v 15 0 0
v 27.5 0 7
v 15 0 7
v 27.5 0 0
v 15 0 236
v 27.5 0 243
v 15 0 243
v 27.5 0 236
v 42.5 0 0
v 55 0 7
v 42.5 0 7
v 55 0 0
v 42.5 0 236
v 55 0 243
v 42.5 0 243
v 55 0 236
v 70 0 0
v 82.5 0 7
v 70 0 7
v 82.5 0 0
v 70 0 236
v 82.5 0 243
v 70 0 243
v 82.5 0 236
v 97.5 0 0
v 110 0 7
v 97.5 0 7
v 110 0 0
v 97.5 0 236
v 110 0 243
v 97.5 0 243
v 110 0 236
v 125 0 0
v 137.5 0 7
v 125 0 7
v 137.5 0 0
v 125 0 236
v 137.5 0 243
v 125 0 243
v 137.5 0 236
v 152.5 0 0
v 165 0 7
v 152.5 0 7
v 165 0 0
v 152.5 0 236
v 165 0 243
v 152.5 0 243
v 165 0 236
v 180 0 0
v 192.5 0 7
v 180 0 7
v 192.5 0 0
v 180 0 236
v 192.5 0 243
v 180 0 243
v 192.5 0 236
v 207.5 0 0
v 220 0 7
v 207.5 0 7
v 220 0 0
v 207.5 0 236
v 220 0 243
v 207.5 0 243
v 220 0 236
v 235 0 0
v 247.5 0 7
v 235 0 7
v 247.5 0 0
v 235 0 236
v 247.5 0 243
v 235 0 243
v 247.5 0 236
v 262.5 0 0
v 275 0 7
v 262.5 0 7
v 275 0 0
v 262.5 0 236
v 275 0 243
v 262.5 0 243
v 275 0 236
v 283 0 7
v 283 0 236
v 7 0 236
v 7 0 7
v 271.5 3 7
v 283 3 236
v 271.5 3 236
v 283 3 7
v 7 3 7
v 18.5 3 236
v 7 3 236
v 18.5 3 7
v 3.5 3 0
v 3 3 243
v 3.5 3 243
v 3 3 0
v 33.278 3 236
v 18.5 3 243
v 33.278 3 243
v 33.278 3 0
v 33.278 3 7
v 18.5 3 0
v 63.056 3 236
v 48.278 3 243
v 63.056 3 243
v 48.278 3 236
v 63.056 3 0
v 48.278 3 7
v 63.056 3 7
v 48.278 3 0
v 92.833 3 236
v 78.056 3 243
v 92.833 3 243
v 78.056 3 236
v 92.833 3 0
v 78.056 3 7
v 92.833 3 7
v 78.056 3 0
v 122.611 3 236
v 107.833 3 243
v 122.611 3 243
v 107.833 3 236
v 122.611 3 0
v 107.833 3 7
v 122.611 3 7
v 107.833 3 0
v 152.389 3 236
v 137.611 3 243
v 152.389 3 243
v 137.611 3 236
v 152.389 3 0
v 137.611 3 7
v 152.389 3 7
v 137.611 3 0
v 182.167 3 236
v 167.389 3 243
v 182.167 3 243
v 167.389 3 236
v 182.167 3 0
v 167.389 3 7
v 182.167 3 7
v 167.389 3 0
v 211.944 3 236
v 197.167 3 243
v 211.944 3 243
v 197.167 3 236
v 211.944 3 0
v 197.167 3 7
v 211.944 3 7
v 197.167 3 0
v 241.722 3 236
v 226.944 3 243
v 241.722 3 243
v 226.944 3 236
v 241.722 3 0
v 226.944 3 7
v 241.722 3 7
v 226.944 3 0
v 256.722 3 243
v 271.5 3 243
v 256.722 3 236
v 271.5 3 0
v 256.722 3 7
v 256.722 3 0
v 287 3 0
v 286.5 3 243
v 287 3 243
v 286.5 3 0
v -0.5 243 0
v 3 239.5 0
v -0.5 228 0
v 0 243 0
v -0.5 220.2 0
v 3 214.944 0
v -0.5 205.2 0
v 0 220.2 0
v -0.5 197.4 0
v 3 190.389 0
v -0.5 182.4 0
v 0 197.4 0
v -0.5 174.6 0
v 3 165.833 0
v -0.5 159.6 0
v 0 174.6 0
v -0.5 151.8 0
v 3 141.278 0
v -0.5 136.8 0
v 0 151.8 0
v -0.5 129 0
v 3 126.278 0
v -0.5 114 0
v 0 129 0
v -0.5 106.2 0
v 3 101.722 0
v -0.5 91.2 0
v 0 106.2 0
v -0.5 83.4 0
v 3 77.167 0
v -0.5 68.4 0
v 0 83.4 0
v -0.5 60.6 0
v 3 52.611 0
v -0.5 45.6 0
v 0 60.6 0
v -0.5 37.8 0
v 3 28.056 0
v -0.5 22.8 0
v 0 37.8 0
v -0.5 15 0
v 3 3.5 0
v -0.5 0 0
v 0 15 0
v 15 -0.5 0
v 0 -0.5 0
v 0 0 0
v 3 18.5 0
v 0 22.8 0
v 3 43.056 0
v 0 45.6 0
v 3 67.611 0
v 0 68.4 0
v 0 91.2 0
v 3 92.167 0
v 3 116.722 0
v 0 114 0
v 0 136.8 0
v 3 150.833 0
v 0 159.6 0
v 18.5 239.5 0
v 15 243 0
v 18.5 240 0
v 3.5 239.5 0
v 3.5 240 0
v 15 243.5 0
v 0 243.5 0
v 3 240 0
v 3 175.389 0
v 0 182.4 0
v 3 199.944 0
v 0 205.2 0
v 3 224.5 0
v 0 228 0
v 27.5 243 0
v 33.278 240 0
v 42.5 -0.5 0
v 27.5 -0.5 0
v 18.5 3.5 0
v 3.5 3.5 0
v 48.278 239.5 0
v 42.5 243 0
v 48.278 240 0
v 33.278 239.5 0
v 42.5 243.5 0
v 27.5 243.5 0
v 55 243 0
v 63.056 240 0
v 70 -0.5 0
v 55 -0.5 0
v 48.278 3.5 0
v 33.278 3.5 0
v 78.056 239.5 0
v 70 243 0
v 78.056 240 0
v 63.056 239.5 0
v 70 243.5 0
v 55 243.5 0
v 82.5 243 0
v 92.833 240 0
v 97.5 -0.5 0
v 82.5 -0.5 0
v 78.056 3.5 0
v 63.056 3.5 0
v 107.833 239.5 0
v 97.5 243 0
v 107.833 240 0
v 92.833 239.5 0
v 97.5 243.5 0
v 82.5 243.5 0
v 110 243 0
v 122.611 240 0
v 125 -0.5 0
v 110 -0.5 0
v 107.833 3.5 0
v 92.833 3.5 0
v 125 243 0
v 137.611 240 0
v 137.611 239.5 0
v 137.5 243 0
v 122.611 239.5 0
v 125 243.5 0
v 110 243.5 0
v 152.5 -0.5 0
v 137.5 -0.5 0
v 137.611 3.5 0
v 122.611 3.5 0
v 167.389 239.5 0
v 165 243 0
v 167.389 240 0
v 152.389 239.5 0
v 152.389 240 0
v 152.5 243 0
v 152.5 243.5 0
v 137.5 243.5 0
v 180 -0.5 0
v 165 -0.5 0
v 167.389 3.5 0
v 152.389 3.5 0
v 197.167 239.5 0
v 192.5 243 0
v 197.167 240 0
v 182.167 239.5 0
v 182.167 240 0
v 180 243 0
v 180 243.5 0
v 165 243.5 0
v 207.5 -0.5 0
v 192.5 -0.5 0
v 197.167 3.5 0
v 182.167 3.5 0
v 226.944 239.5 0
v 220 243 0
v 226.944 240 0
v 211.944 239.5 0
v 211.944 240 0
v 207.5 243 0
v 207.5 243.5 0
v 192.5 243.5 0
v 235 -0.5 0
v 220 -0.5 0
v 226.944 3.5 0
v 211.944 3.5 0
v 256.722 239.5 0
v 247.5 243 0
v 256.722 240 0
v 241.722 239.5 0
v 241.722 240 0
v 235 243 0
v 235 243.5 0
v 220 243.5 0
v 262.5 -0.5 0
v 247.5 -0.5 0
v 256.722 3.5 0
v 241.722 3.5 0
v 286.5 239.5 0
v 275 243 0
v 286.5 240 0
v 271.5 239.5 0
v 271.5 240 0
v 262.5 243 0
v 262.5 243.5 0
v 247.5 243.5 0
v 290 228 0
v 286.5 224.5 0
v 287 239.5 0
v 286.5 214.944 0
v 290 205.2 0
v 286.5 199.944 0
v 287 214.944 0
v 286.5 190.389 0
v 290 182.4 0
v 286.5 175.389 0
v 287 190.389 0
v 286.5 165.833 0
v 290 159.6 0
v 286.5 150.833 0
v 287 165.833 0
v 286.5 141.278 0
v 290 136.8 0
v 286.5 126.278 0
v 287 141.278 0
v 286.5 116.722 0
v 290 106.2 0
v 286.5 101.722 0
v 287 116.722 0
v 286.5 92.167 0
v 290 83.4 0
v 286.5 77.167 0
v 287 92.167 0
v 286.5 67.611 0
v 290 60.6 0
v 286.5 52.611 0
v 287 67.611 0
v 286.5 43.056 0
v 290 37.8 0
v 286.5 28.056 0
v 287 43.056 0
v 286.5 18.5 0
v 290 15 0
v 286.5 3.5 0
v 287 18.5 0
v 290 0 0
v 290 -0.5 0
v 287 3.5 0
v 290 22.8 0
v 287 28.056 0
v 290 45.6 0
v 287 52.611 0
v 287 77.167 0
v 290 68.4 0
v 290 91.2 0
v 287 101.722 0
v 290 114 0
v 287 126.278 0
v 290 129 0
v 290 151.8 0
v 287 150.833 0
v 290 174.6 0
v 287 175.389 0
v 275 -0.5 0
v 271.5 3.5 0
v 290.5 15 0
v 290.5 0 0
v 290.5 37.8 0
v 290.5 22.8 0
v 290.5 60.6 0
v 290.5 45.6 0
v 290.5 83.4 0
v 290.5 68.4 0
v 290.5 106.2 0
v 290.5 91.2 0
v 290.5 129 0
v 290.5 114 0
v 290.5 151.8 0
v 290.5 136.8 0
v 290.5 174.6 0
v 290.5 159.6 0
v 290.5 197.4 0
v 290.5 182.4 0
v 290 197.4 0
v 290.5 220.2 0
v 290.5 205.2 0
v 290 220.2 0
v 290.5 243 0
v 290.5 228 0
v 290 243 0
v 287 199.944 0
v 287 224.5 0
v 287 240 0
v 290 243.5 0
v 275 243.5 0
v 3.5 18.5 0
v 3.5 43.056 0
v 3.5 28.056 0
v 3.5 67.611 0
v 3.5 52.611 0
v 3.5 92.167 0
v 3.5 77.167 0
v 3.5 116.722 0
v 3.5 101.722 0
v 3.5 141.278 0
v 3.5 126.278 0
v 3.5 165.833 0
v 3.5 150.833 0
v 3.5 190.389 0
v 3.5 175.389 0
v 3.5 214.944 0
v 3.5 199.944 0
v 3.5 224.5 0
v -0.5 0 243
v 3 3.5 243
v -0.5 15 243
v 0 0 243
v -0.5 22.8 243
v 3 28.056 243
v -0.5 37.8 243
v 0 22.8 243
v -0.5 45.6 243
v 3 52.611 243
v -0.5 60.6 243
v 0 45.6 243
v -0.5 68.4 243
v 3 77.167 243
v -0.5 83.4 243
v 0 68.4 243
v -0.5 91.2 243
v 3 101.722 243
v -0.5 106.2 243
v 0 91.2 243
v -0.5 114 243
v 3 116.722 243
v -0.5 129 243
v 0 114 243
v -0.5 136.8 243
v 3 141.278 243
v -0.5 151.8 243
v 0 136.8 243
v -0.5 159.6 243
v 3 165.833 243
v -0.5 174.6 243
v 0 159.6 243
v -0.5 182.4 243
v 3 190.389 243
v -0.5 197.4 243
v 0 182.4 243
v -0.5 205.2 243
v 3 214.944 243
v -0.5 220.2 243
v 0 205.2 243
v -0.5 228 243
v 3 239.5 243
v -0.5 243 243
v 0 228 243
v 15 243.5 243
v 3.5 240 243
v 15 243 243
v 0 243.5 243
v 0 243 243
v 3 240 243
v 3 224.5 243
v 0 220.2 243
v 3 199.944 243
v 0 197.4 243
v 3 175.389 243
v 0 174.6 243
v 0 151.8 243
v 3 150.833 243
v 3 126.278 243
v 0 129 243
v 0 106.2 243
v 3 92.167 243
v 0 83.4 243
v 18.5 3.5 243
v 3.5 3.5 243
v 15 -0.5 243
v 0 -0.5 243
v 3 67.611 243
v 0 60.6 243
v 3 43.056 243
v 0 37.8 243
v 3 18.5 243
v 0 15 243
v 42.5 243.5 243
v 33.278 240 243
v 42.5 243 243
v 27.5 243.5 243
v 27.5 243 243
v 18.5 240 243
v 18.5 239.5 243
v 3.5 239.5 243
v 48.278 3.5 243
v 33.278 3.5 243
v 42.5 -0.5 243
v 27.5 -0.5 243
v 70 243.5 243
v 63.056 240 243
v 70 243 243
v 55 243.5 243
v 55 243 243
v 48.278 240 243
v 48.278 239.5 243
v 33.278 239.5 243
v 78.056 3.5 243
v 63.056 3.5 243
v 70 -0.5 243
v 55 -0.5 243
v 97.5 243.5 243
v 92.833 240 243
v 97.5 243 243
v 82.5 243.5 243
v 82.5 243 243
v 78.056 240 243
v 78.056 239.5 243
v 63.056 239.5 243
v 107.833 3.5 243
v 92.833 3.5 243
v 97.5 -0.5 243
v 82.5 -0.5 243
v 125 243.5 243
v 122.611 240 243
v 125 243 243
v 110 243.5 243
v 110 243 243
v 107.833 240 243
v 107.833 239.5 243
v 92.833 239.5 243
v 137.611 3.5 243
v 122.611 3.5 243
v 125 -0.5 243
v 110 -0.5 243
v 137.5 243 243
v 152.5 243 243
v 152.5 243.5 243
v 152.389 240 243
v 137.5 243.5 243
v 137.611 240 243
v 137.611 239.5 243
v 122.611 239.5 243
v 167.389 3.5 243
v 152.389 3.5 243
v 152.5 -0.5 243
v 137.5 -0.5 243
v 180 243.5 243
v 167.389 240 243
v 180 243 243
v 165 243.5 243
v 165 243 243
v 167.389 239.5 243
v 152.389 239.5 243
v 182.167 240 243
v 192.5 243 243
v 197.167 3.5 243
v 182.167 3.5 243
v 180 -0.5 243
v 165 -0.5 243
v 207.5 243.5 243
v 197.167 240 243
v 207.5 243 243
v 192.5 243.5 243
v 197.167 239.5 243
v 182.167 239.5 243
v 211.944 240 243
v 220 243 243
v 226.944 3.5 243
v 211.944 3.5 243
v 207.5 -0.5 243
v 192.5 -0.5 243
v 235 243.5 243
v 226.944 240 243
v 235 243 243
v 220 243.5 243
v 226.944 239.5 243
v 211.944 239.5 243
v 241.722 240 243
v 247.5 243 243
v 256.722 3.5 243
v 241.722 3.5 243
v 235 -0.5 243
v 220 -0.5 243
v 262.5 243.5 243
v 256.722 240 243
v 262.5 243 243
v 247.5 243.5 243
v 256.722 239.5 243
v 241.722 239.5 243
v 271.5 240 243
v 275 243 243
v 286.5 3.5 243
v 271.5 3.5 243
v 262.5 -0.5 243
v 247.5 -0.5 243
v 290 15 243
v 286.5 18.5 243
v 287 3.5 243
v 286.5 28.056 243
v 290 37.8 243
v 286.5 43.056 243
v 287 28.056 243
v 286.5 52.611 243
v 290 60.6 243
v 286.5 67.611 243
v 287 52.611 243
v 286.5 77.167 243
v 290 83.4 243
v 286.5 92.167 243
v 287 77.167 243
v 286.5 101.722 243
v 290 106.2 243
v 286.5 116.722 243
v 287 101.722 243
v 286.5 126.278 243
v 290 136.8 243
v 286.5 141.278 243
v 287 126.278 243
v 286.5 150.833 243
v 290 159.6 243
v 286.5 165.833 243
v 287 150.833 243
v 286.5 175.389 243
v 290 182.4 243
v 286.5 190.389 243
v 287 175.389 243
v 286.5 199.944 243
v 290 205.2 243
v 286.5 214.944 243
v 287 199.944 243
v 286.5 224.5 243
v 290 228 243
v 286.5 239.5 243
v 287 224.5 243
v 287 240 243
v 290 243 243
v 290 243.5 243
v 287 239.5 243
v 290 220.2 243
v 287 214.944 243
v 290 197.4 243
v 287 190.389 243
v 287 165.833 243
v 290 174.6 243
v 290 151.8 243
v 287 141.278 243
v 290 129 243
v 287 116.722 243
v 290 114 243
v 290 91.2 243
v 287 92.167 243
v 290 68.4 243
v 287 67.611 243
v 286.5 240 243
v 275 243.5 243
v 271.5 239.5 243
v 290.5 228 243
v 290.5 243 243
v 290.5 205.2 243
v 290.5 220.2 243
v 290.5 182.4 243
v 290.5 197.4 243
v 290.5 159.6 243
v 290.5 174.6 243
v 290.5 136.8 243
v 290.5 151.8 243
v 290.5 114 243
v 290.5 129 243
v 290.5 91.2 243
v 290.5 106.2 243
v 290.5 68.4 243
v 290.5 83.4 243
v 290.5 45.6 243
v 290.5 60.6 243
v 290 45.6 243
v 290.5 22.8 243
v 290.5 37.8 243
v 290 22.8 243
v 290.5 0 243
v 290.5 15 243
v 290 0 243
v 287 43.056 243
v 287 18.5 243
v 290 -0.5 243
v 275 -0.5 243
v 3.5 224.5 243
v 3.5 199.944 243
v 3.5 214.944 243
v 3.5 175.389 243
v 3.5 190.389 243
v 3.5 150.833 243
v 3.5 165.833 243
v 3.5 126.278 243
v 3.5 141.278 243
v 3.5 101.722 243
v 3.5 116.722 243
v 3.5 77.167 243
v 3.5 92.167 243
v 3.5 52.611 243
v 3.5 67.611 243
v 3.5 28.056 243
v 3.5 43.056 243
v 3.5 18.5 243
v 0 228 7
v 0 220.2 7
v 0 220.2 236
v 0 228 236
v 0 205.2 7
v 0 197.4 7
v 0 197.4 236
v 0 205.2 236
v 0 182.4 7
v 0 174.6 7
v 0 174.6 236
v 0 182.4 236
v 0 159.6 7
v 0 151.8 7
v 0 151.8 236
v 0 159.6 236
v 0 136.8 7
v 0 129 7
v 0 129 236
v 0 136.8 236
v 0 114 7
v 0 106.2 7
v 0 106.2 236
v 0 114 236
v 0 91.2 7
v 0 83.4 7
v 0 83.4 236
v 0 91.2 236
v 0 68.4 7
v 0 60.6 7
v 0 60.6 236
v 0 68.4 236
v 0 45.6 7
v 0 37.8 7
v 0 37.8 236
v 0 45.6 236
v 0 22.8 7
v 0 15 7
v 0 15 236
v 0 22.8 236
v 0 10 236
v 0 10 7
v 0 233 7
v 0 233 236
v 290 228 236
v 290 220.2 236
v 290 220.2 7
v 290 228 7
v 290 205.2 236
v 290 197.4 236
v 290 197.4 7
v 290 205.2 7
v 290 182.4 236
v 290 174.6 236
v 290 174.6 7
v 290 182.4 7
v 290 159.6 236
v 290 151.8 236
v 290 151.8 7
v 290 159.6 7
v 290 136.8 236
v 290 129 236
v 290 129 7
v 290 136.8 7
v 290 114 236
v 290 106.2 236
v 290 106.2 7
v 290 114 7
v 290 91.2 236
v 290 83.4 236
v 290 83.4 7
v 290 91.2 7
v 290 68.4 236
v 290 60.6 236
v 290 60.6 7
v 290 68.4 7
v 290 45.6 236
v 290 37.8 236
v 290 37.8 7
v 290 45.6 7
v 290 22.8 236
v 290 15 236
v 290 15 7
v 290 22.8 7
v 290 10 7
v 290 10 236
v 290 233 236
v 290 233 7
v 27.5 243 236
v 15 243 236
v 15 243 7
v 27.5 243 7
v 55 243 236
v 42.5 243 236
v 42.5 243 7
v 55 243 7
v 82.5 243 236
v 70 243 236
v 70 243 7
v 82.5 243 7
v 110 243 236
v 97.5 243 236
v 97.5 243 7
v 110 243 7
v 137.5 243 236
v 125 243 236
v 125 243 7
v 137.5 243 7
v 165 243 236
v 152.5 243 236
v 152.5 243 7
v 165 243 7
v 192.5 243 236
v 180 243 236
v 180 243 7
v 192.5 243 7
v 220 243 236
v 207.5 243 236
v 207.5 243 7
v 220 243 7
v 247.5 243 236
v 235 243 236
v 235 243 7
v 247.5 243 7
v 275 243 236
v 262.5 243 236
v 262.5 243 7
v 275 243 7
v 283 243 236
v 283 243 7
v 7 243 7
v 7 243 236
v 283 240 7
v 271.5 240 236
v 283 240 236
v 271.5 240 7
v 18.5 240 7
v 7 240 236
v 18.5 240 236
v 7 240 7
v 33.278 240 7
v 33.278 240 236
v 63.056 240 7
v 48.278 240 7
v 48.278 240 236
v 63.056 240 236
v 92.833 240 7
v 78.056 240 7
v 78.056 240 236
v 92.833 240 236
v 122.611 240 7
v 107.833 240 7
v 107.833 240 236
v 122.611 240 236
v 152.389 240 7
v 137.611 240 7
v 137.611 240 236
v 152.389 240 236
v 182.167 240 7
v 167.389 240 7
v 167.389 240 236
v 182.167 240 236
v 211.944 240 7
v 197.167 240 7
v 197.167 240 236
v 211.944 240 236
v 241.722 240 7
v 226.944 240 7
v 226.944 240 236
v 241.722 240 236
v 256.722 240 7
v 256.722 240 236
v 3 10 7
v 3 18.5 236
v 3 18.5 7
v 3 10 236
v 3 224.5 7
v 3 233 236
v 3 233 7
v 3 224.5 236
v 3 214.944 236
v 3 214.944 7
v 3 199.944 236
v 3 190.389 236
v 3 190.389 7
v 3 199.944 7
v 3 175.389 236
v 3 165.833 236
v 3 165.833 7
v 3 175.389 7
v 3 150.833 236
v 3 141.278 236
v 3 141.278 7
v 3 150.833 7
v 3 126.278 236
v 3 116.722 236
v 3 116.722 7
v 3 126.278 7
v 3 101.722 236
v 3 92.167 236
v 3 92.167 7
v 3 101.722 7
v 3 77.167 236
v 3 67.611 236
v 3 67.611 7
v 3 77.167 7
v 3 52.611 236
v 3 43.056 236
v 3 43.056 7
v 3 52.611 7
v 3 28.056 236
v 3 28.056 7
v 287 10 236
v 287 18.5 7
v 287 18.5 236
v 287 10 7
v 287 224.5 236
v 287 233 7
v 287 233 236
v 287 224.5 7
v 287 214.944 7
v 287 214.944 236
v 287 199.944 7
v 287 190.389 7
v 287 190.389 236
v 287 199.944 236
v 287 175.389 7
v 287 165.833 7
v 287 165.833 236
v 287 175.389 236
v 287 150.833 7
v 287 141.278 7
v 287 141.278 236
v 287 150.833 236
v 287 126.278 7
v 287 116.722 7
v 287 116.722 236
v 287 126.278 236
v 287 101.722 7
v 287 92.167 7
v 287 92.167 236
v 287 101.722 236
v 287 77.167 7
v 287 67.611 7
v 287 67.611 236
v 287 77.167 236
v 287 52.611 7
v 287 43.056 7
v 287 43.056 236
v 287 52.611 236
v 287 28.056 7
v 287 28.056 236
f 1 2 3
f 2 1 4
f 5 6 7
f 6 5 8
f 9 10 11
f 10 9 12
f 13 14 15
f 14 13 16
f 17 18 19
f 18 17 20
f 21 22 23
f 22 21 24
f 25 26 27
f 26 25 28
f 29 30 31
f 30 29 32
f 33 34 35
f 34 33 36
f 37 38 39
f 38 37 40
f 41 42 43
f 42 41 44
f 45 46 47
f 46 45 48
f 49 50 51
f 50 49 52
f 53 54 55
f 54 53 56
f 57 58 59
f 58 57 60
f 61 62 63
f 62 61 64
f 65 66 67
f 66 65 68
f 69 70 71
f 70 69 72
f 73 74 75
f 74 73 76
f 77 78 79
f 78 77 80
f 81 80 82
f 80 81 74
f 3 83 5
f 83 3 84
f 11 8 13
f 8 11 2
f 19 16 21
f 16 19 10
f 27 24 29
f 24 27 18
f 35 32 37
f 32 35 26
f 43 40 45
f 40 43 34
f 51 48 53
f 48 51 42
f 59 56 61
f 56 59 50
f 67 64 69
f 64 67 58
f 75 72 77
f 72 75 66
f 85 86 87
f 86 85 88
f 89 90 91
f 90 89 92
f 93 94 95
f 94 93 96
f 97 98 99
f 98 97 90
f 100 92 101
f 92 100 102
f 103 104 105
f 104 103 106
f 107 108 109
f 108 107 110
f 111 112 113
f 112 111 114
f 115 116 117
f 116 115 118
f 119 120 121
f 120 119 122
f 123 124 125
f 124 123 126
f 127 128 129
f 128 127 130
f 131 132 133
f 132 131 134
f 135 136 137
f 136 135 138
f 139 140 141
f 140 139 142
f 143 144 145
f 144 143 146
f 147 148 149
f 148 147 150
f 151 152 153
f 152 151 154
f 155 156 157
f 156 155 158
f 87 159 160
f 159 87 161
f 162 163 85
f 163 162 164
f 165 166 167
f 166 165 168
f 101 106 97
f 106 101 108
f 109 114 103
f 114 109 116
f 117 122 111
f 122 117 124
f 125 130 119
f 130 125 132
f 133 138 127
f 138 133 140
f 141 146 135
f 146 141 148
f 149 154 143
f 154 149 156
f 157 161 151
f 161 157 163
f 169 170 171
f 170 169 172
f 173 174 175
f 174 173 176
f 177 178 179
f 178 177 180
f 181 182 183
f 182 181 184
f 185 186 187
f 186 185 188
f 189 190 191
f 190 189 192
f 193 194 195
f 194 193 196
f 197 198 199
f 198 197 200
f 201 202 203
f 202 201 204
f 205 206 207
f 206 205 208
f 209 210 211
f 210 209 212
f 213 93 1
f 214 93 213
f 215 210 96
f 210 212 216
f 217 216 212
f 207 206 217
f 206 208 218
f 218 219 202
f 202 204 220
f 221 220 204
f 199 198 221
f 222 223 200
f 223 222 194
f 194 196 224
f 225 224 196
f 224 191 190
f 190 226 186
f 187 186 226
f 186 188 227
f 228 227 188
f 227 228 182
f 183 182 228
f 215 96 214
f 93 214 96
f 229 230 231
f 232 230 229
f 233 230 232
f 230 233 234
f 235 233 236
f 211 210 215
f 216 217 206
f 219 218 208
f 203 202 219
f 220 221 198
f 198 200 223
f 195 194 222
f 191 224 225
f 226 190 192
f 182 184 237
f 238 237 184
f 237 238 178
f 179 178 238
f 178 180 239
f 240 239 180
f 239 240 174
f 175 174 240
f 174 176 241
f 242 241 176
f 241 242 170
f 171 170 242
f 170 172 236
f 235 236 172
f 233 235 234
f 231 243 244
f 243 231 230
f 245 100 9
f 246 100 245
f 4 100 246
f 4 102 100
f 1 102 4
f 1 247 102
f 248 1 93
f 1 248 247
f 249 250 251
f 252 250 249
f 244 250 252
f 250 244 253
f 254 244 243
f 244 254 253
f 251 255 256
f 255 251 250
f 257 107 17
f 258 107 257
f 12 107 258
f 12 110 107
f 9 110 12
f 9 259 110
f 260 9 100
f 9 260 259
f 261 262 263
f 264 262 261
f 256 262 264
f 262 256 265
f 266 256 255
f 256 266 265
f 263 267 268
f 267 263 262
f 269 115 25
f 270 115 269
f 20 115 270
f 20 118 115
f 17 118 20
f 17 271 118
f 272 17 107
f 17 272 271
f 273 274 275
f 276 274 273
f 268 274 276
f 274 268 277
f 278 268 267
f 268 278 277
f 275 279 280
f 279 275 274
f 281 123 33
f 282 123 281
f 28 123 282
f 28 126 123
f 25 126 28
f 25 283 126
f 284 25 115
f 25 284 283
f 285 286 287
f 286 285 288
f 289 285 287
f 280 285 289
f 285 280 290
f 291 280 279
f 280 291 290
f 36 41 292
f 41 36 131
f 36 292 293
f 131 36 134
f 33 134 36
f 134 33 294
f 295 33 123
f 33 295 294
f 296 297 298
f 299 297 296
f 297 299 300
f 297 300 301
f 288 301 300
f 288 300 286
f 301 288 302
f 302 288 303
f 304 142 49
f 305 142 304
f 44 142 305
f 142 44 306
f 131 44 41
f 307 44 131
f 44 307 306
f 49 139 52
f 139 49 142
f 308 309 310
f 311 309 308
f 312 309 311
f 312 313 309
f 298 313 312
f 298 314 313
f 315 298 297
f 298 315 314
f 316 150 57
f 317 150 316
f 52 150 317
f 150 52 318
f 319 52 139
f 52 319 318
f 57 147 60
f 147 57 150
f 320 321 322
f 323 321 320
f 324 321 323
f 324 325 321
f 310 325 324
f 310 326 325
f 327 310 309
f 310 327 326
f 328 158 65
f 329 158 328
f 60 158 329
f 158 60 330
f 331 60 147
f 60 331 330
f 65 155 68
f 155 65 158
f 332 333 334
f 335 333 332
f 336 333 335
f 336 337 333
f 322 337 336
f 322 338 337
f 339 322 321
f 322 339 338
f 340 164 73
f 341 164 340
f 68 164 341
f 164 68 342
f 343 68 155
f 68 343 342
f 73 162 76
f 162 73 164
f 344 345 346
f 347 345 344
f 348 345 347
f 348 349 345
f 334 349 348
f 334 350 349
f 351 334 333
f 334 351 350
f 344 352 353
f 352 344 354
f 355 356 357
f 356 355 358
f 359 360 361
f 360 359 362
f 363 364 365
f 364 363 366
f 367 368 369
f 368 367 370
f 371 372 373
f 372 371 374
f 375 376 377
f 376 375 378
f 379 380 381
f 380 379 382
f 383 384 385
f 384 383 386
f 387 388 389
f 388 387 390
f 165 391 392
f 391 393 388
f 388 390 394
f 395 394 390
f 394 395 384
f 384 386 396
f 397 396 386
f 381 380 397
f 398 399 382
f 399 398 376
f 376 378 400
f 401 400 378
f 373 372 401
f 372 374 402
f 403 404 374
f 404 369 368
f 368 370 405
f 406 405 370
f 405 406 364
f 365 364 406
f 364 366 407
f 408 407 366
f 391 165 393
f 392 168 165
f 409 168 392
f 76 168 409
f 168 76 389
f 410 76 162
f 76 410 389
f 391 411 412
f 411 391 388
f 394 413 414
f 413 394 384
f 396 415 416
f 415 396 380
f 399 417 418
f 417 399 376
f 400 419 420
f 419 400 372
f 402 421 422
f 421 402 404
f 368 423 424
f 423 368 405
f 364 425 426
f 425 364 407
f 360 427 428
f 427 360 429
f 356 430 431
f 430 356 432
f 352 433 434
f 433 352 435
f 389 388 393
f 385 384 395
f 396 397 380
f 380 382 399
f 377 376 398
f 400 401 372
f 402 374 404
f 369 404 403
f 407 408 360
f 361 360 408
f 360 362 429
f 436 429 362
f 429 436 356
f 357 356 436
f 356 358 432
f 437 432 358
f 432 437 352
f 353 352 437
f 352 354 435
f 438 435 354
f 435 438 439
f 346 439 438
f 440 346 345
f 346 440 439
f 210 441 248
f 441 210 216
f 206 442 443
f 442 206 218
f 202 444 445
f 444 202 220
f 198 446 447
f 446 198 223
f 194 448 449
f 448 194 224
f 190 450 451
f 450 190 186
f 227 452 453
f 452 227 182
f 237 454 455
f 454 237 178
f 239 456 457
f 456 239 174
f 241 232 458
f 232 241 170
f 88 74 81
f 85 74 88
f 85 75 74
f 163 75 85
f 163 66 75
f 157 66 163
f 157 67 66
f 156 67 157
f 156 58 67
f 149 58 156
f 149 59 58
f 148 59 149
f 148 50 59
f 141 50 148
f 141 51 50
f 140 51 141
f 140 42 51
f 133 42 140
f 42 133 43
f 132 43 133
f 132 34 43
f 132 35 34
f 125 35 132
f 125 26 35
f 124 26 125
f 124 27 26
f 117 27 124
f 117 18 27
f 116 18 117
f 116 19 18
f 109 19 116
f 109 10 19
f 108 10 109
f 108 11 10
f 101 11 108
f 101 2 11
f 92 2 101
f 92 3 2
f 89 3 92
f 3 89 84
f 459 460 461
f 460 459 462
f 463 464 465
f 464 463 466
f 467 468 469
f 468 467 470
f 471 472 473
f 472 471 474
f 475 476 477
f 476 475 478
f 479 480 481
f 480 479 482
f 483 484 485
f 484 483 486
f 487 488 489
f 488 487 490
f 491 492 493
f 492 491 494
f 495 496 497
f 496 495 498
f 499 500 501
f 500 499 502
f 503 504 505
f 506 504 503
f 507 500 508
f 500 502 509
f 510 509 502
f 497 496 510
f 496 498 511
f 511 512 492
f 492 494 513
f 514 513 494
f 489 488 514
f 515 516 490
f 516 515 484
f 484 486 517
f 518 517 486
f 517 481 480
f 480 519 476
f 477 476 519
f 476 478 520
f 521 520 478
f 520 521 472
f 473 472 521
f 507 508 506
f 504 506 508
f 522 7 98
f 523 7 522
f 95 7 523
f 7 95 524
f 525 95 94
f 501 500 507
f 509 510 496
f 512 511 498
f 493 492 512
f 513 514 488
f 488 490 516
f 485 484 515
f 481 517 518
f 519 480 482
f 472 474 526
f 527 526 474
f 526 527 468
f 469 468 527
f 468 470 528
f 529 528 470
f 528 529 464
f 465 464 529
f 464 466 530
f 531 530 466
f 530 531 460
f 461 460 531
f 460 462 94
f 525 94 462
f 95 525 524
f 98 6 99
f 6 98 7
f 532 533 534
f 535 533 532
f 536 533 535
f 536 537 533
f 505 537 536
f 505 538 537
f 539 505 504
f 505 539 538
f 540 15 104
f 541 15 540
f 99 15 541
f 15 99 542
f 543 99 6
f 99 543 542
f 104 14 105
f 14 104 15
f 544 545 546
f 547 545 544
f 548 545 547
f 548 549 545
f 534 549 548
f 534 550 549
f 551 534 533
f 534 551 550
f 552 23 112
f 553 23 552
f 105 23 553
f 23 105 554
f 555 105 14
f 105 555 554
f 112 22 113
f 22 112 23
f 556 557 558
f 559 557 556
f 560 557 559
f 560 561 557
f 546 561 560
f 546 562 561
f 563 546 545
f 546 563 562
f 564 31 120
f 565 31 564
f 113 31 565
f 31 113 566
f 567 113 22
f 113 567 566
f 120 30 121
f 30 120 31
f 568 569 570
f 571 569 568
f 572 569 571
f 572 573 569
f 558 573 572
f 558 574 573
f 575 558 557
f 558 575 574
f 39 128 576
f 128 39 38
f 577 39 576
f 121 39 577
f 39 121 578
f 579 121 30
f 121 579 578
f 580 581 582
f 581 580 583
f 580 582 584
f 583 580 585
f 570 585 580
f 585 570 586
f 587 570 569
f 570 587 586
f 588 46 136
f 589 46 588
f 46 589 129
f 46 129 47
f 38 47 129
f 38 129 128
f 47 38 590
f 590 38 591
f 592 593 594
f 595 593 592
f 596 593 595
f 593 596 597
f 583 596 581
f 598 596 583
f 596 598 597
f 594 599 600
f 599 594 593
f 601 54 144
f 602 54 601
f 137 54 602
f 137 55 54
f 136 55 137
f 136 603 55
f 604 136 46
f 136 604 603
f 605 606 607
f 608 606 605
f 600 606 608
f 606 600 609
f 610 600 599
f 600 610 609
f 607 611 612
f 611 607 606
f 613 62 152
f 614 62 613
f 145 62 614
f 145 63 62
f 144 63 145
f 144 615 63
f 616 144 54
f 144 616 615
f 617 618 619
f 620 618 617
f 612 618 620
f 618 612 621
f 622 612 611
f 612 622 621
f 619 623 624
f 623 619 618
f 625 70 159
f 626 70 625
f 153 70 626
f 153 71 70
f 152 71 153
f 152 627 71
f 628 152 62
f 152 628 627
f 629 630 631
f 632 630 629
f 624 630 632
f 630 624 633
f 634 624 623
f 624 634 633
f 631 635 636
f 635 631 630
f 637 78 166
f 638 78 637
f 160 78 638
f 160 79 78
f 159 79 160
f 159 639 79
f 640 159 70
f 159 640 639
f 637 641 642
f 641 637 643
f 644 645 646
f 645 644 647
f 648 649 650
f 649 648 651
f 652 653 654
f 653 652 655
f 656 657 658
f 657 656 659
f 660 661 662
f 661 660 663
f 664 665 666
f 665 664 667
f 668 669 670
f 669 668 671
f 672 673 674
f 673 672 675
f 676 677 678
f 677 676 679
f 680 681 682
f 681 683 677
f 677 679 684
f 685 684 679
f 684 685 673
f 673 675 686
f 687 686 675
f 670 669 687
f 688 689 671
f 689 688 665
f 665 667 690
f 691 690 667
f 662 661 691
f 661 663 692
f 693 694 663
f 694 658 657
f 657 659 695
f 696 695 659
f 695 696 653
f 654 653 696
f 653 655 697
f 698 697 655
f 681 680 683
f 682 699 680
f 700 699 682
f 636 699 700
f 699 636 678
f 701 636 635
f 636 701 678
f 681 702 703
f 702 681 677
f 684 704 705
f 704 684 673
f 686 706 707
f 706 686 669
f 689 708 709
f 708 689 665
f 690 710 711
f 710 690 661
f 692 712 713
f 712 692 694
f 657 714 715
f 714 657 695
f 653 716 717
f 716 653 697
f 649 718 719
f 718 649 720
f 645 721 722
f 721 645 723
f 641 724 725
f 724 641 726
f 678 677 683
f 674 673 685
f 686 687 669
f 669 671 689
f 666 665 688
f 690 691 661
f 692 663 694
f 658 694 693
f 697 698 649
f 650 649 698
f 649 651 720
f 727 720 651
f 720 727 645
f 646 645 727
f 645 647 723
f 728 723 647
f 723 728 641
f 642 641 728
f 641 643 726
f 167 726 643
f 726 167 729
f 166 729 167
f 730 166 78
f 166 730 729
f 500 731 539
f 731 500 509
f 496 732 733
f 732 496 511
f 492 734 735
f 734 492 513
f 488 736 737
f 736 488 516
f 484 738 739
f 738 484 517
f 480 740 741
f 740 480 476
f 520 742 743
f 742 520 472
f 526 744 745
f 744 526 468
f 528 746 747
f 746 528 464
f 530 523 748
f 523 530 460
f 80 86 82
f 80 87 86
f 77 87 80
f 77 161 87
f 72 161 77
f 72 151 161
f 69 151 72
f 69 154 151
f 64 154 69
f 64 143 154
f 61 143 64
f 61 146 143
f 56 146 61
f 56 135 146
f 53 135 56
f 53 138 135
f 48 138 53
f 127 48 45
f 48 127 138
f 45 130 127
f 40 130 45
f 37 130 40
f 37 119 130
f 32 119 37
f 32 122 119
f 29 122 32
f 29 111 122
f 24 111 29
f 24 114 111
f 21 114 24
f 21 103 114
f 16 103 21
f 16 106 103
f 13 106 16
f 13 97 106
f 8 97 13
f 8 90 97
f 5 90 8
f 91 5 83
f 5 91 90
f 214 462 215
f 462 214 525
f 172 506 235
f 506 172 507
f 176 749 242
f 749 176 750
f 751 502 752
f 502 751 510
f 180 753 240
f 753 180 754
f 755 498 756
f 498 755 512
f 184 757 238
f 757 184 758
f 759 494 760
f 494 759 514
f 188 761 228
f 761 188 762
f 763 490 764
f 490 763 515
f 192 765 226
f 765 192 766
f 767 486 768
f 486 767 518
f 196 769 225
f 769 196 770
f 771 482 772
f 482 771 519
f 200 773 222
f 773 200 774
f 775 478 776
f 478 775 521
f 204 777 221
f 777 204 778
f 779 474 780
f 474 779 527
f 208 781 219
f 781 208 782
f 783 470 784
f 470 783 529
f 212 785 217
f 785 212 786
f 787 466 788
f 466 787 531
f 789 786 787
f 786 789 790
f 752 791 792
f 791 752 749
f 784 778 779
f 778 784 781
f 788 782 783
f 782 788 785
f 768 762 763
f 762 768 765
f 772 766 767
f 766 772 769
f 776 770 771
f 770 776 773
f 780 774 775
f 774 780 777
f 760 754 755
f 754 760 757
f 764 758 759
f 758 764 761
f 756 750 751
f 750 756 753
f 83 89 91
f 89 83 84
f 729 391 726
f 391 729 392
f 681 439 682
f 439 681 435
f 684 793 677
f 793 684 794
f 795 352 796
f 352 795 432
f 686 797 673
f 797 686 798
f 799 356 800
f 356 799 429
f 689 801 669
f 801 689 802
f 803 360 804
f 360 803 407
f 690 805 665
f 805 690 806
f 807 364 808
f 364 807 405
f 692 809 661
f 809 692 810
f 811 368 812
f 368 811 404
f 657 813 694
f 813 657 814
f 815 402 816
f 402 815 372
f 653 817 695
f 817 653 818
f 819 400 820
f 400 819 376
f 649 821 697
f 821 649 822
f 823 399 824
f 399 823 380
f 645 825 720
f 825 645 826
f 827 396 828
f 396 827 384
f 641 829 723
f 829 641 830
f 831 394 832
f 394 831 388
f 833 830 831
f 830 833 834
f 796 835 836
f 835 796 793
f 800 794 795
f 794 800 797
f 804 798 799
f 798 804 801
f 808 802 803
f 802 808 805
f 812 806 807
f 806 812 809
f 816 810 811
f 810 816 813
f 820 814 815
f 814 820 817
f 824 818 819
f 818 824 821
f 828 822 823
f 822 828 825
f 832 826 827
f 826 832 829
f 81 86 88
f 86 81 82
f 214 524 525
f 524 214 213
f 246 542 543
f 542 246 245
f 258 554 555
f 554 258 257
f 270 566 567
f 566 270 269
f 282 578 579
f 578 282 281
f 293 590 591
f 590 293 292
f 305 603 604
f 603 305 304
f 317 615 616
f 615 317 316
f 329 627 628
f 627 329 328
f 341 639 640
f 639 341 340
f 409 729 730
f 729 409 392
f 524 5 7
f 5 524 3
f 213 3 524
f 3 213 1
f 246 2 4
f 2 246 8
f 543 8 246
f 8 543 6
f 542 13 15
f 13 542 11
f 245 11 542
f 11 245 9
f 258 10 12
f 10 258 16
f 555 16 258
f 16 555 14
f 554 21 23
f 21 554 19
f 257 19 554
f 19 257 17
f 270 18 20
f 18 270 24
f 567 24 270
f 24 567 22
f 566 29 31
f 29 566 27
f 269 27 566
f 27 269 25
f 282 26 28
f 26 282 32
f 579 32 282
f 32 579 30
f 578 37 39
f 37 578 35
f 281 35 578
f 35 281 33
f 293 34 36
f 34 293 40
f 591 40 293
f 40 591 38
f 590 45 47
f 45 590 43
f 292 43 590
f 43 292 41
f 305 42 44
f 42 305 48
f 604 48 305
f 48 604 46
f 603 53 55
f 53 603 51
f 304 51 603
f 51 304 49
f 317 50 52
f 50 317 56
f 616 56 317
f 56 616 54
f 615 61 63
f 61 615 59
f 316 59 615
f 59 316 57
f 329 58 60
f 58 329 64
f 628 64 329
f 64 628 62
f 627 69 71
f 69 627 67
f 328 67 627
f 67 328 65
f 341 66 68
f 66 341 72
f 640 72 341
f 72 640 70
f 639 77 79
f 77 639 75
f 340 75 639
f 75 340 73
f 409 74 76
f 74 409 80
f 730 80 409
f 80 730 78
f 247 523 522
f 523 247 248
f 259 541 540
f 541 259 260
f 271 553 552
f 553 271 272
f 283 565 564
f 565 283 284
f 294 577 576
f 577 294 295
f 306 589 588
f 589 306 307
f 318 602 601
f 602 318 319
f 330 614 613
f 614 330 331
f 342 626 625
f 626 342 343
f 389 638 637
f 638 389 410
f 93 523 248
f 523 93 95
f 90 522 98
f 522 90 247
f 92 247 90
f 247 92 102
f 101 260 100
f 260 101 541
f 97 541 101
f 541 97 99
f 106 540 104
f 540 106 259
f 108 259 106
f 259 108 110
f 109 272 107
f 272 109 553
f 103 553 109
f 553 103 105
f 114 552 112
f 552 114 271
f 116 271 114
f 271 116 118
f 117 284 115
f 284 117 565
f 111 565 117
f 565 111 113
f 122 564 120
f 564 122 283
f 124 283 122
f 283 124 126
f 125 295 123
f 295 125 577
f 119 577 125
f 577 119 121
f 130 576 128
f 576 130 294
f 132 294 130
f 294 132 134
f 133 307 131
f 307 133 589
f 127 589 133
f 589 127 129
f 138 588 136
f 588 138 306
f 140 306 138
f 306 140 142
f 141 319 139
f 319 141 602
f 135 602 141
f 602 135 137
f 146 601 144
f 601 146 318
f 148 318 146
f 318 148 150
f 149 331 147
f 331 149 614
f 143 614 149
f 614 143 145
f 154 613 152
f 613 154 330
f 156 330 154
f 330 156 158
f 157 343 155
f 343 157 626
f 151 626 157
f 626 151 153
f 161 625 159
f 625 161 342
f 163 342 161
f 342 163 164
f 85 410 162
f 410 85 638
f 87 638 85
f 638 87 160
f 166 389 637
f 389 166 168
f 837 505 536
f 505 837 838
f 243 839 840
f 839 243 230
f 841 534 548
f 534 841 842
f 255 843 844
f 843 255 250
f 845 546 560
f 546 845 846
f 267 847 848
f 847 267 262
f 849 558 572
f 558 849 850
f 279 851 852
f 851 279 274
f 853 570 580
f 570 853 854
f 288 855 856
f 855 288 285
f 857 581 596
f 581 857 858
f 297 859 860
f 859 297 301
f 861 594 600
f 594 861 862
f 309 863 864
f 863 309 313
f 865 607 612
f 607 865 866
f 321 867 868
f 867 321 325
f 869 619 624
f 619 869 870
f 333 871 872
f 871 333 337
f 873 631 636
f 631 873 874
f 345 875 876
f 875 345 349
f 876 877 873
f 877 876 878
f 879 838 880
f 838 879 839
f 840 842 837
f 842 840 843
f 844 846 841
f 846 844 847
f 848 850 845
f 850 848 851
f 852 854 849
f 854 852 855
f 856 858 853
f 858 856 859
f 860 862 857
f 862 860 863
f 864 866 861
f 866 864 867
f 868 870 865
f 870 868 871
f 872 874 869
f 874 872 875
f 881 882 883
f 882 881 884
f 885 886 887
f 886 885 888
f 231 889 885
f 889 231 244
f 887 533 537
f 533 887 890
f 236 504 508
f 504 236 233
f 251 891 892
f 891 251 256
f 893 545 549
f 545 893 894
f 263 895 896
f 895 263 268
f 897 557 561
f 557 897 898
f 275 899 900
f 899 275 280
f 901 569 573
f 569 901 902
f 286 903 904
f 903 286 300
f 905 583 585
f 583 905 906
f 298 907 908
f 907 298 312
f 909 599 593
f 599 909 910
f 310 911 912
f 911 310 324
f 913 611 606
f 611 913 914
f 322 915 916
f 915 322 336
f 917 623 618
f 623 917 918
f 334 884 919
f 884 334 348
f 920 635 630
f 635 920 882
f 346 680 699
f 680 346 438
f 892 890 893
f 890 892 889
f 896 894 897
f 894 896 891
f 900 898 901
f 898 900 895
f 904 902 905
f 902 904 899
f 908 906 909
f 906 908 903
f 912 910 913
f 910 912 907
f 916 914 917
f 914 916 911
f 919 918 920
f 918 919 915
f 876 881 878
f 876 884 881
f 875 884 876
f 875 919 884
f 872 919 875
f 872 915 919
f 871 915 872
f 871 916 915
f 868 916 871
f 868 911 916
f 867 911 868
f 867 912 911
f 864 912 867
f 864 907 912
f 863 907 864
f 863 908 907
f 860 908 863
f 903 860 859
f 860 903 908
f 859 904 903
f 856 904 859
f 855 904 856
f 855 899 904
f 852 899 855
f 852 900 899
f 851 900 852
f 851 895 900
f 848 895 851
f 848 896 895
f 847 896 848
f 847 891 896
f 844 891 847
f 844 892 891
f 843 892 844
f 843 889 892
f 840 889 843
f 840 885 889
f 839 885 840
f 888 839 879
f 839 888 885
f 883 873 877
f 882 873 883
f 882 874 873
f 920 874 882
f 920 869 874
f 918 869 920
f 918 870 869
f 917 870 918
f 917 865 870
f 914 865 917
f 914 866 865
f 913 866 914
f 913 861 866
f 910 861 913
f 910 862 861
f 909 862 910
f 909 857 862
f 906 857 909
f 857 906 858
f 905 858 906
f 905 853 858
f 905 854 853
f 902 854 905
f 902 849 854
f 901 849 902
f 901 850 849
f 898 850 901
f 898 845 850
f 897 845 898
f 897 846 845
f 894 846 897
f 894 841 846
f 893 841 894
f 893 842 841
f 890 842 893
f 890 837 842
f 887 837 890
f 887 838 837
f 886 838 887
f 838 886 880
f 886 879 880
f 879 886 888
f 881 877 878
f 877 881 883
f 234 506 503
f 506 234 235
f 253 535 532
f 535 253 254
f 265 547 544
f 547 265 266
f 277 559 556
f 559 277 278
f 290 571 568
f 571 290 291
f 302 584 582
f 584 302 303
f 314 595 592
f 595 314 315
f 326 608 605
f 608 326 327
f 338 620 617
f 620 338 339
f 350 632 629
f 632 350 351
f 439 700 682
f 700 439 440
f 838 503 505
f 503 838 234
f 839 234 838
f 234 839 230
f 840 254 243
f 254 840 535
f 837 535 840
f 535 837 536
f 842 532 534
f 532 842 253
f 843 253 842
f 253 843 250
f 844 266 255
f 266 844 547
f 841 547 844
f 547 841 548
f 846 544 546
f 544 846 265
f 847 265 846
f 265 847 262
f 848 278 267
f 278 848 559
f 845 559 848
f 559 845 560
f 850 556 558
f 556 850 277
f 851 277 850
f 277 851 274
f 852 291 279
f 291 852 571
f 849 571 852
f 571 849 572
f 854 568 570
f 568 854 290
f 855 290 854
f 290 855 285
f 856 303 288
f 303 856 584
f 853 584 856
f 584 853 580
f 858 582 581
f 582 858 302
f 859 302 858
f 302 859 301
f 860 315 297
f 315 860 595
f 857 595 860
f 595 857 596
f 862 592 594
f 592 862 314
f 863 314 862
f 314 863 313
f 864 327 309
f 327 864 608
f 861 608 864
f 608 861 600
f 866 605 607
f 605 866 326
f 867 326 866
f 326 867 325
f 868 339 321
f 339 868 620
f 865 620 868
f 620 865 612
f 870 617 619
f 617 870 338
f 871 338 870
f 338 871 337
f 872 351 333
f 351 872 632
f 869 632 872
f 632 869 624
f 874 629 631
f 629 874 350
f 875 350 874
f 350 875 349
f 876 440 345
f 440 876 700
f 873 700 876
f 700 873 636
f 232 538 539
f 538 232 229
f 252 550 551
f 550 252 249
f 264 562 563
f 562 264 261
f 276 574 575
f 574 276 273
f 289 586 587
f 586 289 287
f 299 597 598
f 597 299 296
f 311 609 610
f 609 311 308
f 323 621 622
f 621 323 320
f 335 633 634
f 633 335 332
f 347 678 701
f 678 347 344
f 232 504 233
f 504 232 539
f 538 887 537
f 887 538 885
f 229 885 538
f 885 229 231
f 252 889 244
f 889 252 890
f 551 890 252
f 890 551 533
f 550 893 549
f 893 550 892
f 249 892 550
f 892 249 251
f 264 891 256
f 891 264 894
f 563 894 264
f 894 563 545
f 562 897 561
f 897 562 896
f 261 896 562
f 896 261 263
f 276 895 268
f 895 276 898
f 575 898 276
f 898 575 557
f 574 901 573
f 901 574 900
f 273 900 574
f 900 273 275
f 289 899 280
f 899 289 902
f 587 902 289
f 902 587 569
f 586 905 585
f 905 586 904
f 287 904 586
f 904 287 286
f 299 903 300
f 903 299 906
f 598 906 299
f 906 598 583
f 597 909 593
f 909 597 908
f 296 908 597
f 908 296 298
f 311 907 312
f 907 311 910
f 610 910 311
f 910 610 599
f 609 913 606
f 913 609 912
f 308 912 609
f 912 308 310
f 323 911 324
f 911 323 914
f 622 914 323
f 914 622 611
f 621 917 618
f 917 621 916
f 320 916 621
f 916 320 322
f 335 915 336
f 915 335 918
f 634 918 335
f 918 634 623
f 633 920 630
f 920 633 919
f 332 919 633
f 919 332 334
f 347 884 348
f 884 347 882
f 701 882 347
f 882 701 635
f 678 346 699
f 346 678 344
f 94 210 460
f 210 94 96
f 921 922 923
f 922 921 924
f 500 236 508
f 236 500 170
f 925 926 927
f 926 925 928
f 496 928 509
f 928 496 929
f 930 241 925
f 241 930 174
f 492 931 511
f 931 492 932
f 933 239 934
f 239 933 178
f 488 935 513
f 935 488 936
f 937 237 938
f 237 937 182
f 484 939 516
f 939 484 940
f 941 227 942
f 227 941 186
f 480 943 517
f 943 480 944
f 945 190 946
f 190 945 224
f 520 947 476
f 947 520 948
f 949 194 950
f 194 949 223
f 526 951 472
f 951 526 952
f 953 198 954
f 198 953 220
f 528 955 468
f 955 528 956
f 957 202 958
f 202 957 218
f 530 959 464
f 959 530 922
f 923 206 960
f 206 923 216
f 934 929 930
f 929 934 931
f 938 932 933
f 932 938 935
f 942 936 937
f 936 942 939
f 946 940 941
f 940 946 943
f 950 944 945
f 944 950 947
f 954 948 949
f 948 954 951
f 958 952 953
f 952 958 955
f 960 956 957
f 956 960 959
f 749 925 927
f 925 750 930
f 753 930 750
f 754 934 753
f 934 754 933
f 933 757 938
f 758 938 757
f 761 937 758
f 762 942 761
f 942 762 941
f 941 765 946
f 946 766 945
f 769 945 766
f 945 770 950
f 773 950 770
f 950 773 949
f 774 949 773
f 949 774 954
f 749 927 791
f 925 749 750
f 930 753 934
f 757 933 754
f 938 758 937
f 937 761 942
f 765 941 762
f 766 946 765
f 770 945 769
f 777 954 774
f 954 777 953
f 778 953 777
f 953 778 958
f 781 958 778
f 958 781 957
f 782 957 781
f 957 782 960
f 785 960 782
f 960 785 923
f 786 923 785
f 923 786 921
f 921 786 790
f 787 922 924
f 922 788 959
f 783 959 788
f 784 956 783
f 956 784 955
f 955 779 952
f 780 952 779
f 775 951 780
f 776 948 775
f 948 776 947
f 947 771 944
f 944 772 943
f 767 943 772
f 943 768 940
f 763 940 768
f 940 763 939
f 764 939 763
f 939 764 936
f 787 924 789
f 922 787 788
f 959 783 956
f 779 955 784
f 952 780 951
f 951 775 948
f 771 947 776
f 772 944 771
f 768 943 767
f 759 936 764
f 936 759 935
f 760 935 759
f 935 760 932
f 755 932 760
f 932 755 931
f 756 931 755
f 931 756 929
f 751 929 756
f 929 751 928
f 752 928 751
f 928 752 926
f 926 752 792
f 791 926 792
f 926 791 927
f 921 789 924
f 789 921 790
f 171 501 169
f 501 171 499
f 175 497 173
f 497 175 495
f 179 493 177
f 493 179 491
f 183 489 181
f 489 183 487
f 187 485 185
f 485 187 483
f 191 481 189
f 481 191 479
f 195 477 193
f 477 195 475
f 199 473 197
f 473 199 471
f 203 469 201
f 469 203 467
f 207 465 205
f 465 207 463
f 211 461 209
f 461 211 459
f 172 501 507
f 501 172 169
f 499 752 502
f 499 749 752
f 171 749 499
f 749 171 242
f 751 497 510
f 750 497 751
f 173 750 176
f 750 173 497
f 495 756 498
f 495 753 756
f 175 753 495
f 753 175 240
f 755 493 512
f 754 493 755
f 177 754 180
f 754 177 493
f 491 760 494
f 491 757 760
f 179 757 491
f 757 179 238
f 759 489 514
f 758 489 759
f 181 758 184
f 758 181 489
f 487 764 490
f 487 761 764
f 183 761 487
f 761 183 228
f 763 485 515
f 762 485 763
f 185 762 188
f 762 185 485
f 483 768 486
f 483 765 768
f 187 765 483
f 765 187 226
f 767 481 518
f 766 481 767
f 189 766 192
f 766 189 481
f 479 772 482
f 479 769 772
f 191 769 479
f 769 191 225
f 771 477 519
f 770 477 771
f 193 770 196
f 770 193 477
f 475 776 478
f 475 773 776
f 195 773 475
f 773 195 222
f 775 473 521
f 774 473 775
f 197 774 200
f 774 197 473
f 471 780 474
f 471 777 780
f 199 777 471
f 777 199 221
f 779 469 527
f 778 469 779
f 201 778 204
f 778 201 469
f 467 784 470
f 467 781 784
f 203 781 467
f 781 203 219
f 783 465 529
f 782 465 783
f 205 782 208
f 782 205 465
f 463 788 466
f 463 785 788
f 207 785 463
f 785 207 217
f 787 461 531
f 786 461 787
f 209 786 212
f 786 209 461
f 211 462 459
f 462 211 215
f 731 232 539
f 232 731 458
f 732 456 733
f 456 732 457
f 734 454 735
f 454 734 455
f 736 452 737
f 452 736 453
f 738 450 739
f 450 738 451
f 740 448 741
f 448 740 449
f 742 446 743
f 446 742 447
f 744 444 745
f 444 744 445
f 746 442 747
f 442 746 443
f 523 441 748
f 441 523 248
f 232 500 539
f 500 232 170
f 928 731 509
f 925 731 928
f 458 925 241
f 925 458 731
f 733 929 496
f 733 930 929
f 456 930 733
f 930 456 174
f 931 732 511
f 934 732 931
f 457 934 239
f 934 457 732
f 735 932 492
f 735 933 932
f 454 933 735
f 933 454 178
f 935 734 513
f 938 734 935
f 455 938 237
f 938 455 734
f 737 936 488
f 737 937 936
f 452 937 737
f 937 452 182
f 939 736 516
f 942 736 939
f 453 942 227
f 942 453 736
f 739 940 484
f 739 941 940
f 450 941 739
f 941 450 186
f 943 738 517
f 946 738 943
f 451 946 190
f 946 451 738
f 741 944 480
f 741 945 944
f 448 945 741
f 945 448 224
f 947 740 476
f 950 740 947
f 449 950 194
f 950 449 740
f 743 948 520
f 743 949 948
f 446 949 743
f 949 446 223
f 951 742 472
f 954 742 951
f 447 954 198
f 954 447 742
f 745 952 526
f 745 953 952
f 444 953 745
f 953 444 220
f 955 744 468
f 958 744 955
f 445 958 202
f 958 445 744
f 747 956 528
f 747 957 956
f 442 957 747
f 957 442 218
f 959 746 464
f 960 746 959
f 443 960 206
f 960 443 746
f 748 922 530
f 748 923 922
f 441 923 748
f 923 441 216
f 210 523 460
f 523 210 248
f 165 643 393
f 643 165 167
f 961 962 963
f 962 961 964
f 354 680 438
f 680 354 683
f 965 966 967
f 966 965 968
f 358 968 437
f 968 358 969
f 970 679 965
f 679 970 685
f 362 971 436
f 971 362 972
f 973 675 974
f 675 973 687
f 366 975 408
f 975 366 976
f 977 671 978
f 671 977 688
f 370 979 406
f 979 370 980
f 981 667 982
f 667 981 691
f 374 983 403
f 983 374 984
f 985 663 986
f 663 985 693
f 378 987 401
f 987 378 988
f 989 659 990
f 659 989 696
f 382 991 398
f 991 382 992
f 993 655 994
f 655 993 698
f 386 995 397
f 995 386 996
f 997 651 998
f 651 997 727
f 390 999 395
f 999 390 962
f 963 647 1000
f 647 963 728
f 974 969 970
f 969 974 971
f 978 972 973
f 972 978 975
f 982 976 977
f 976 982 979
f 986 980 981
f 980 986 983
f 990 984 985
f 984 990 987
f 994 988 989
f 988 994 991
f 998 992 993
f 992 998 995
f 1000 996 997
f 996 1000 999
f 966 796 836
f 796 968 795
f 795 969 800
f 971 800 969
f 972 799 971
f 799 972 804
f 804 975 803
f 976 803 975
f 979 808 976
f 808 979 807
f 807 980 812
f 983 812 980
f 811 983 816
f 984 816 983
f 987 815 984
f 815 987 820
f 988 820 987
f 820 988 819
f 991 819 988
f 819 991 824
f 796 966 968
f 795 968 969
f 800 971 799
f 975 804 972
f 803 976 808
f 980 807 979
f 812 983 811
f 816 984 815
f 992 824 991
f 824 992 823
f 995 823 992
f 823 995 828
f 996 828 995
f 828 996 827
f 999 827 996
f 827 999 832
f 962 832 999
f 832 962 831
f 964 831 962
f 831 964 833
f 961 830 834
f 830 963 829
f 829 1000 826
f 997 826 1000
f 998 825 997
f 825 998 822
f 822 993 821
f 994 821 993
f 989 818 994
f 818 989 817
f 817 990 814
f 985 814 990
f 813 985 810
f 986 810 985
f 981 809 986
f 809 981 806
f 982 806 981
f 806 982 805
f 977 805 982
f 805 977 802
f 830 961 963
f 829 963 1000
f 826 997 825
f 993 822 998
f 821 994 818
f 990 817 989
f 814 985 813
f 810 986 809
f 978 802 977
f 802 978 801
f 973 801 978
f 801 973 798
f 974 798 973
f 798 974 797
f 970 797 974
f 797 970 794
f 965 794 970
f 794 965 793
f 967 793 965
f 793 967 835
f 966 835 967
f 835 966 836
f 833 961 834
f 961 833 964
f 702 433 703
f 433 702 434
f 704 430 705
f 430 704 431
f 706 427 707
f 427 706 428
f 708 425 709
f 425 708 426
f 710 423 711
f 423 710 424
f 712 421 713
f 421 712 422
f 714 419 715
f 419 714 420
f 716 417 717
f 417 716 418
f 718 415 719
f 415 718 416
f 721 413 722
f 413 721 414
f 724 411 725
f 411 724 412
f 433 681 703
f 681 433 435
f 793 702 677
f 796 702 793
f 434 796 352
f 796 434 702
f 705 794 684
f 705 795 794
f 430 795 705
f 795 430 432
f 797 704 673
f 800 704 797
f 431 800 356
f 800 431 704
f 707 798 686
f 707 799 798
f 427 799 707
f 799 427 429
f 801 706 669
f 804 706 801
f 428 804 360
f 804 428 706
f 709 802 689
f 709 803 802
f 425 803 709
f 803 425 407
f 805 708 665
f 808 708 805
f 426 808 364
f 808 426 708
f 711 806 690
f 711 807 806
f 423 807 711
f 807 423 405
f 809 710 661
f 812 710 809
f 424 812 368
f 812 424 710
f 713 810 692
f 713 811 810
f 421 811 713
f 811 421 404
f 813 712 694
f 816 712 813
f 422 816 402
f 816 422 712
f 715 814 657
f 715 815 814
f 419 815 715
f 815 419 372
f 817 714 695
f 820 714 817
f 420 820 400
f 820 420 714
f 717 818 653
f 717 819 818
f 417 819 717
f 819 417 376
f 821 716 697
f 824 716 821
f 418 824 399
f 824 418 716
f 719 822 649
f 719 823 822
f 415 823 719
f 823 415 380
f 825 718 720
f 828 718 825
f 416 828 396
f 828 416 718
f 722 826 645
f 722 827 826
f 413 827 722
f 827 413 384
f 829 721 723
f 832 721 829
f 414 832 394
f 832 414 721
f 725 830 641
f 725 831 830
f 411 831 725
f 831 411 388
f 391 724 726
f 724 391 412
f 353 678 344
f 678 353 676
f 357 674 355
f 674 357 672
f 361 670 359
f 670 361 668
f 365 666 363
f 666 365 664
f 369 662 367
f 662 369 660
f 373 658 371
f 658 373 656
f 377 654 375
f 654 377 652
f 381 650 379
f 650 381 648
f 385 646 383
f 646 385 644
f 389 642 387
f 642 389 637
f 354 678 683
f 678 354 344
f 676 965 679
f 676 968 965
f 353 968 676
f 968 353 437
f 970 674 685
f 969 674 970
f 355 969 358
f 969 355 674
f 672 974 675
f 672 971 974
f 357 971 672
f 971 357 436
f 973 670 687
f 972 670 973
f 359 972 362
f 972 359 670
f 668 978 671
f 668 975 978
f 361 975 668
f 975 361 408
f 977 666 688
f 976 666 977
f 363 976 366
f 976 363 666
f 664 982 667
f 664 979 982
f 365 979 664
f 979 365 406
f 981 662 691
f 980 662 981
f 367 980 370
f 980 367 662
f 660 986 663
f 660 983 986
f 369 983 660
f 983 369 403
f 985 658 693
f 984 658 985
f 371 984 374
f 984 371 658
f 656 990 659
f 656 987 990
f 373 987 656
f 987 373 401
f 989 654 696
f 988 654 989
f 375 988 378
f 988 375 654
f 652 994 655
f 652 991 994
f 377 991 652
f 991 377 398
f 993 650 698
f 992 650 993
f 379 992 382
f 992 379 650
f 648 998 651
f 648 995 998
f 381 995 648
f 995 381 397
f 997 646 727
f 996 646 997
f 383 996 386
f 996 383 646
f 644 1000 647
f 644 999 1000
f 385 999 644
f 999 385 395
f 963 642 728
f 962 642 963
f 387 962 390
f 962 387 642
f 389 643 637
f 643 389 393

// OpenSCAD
// file: strut_2d.scad
//
// Create a strut with connectors
//
// Example
// -------
//     strut(100, 10, type=["f", "m"]);  
//         __________________________
//  ^     /                          \_
// 10   _|                             |
//  v  /                                \
//    ------------------------------------
//    <---             100             -->

//strut_2d(100, 10, type=["f", "f"]);


function calc_connector_shift(size, connector_factor=0.4) = 
    let (diagonal = size * sqrt(2))
    let (diagonal_connector = connector_factor * diagonal)
    let (shift_diagonal = diagonal/2 - diagonal_connector/2)
    shift_diagonal * sqrt(2);

module strut_connector(size, type="f", connector_factor=0.3){
    connector_shift = calc_connector_shift(size, connector_factor);
  
  
    if (type == "f")
    {
        difference() {
            polygon([[0,0],
                     [size, size],
                     [size, 0]]);
            translate([connector_shift, connector_shift, 0])
              scale([connector_factor, connector_factor ,1])
                    polygon([[0,0],
                             [size, size],
                             [size, 0]]);}
    }
    else if (type == "m")
    {
        union() {
            polygon([[0,0],
                     [size, size],
                     [size, 0]]);
            translate([connector_shift, connector_shift, 0])
              scale([connector_factor, connector_factor ,1])
                polygon([[0,0],
                         [size, size],
                         [0, size]]);}
    }
    else
    {
        echo("Unspecified type!");
    }
}


module strut_2d(width, height, type=["f", "f"]){
    strut_connector(height, type=type[0]);
    translate([height, 0, 0])
        square([width-2*height, height]);
    translate([width, 0, 0])
        mirror([1,0,0])
            strut_connector(height, type=type[1]);
}
// file: facing_2d.scad
module facing_element_2d(width, height)
{
    square([width, height]);
}

module facing_2d(width, height, element_width, no_of_elements=2)
{
    function calculate_element_spacing(width, element_width, no_of_elements) = 
        (width - element_width) / (no_of_elements-1) - element_width;
    
    function calculate_element_position(index) = 
        let (spacing = calculate_element_spacing(width, element_width, no_of_elements))
        [index * (element_width + spacing), 0, 0];
    

    for (i = [0 : no_of_elements-1])
    {   
        translate(calculate_element_position(i))
            facing_element_2d(element_width, height);
    }
}
// file: strut.scad
//
// Create a strut with connectors
//
// Example
// -------
//     strut(100, 10, type=["f", "m"]);  
//         __________________________
//  ^     /                          \_
// 10   _|                             |
//  v  /                    t=thickness \
//    ------------------------------------
//    <---             100             -->

include<strut_2d.scad>

module strut(width, height, thickness=10, type=["f", "f"], make_3d=false)
{
    if (make_3d)
        linear_extrude(thickness)
            strut_2d(width, height, type);
    else
        strut_2d(width, height, type);
}
// file: facing.scad
include <facing_2d.scad>

module facing(width, height, element_width, no_of_elements, thickness=1, make_3d=false)
{
    if (make_3d)
        linear_extrude(thickness)
            facing_2d(width, height, element_width, no_of_elements);
    else
        facing_2d(width, height, element_width, no_of_elements);
}
// file: frame.scad
include<strut.scad>

// frame(100, 50, thickness=7, make_3d=true);

module arrange_bottom_strut(width, height, frame_width, thickness, make_3d, spacing_2d)
{
    if (make_3d)
    {
        translate([0,0,0])
            children();
    }
    else
    {
        translate([0,0,0])
            children();
    }
}

module arrange_top_strut(width, height, frame_width, thickness, make_3d, spacing_2d)
{
    if (make_3d)
    {
        translate([0,height,0])
            mirror([0,1,0])
                children();
    }
    else
    {
        translate([0, frame_width + spacing_2d, 0])
                children();
    }
}

module arrange_left_strut(width, height, frame_width, thickness, make_3d, spacing_2d)
{
    if (make_3d)
    {
        translate([0,0,0])
            rotate([0,0,-90])
            mirror([1,0,0])
                children();
    }
    else
    {
        translate([0, 2 * (frame_width + spacing_2d), 0])
                children();
    }
}

module arrange_right_strut(width, height, frame_width, thickness, make_3d, spacing_2d)
{
    if (make_3d)
    {
        translate([width,0,0])
            rotate([0,0,90])
            // mirror([1,0,0])
                children();
    }
    else
    {
        translate([0, 3 * (frame_width + spacing_2d), 0])
                children();
    }
}

module frame(width, height, frame_width=10, thickness = 0, make_3d=false, spacing_2d=1)
{
    // Create bottom strut
    color("red")
    arrange_bottom_strut(width, height, frame_width, thickness, make_3d, spacing_2d)
        strut(width=width, height=frame_width, thickness=thickness, type=["f", "f"], make_3d=make_3d);

    translate([0,0,0])
        strut(width=width, height=frame_width, thickness=thickness, type=["f", "f"], make_3d=make_3d);

    // Create top strut
    color("orange")
    arrange_top_strut(width, height, frame_width, thickness, make_3d, spacing_2d)
        strut(width=width, height=frame_width, thickness=thickness, type=["f", "f"], make_3d=make_3d);

    // Create left strut
    color("green")
    arrange_left_strut(width, height, frame_width, thickness, make_3d, spacing_2d)
        strut(width=height, height=frame_width, thickness=thickness, type=["m", "m"], make_3d=make_3d);

    // Create right strut
    color("violet")
    arrange_right_strut(width, height, frame_width, thickness, make_3d, spacing_2d)
        strut(width=height, height=frame_width, thickness=thickness, type=["m", "m"], make_3d=make_3d);

}
// main file
include <box.scad>

make_3d=true;

box_thickness=3; //[1:0.5:10]
frame_width=7; //[1:0.5:10]

top=false;
bottom=false;
left=true;
right=true;
front=true;
back=true;


box_width=290; //[50:1:500]
box_height=243; //[50:1:500]
box_depth=243; //[50:1:500]

box(box_width, box_height, box_depth, frame_width=frame_width, thickness=box_thickness, make_3d=make_3d,
    top=top, bottom=bottom, left=left, right=right, front=front, back=back);

// include <facing.scad>

// facing_thickness=0.5; //[0.1:0.1:2.0]
// facing_element_width=20; //[5:1:100]
// facing_element_no=5; //[1:1:20]

// facing(box_width, box_height, facing_element_width, facing_element_no, thickness=facing_thickness, make_3d=make_3d);
